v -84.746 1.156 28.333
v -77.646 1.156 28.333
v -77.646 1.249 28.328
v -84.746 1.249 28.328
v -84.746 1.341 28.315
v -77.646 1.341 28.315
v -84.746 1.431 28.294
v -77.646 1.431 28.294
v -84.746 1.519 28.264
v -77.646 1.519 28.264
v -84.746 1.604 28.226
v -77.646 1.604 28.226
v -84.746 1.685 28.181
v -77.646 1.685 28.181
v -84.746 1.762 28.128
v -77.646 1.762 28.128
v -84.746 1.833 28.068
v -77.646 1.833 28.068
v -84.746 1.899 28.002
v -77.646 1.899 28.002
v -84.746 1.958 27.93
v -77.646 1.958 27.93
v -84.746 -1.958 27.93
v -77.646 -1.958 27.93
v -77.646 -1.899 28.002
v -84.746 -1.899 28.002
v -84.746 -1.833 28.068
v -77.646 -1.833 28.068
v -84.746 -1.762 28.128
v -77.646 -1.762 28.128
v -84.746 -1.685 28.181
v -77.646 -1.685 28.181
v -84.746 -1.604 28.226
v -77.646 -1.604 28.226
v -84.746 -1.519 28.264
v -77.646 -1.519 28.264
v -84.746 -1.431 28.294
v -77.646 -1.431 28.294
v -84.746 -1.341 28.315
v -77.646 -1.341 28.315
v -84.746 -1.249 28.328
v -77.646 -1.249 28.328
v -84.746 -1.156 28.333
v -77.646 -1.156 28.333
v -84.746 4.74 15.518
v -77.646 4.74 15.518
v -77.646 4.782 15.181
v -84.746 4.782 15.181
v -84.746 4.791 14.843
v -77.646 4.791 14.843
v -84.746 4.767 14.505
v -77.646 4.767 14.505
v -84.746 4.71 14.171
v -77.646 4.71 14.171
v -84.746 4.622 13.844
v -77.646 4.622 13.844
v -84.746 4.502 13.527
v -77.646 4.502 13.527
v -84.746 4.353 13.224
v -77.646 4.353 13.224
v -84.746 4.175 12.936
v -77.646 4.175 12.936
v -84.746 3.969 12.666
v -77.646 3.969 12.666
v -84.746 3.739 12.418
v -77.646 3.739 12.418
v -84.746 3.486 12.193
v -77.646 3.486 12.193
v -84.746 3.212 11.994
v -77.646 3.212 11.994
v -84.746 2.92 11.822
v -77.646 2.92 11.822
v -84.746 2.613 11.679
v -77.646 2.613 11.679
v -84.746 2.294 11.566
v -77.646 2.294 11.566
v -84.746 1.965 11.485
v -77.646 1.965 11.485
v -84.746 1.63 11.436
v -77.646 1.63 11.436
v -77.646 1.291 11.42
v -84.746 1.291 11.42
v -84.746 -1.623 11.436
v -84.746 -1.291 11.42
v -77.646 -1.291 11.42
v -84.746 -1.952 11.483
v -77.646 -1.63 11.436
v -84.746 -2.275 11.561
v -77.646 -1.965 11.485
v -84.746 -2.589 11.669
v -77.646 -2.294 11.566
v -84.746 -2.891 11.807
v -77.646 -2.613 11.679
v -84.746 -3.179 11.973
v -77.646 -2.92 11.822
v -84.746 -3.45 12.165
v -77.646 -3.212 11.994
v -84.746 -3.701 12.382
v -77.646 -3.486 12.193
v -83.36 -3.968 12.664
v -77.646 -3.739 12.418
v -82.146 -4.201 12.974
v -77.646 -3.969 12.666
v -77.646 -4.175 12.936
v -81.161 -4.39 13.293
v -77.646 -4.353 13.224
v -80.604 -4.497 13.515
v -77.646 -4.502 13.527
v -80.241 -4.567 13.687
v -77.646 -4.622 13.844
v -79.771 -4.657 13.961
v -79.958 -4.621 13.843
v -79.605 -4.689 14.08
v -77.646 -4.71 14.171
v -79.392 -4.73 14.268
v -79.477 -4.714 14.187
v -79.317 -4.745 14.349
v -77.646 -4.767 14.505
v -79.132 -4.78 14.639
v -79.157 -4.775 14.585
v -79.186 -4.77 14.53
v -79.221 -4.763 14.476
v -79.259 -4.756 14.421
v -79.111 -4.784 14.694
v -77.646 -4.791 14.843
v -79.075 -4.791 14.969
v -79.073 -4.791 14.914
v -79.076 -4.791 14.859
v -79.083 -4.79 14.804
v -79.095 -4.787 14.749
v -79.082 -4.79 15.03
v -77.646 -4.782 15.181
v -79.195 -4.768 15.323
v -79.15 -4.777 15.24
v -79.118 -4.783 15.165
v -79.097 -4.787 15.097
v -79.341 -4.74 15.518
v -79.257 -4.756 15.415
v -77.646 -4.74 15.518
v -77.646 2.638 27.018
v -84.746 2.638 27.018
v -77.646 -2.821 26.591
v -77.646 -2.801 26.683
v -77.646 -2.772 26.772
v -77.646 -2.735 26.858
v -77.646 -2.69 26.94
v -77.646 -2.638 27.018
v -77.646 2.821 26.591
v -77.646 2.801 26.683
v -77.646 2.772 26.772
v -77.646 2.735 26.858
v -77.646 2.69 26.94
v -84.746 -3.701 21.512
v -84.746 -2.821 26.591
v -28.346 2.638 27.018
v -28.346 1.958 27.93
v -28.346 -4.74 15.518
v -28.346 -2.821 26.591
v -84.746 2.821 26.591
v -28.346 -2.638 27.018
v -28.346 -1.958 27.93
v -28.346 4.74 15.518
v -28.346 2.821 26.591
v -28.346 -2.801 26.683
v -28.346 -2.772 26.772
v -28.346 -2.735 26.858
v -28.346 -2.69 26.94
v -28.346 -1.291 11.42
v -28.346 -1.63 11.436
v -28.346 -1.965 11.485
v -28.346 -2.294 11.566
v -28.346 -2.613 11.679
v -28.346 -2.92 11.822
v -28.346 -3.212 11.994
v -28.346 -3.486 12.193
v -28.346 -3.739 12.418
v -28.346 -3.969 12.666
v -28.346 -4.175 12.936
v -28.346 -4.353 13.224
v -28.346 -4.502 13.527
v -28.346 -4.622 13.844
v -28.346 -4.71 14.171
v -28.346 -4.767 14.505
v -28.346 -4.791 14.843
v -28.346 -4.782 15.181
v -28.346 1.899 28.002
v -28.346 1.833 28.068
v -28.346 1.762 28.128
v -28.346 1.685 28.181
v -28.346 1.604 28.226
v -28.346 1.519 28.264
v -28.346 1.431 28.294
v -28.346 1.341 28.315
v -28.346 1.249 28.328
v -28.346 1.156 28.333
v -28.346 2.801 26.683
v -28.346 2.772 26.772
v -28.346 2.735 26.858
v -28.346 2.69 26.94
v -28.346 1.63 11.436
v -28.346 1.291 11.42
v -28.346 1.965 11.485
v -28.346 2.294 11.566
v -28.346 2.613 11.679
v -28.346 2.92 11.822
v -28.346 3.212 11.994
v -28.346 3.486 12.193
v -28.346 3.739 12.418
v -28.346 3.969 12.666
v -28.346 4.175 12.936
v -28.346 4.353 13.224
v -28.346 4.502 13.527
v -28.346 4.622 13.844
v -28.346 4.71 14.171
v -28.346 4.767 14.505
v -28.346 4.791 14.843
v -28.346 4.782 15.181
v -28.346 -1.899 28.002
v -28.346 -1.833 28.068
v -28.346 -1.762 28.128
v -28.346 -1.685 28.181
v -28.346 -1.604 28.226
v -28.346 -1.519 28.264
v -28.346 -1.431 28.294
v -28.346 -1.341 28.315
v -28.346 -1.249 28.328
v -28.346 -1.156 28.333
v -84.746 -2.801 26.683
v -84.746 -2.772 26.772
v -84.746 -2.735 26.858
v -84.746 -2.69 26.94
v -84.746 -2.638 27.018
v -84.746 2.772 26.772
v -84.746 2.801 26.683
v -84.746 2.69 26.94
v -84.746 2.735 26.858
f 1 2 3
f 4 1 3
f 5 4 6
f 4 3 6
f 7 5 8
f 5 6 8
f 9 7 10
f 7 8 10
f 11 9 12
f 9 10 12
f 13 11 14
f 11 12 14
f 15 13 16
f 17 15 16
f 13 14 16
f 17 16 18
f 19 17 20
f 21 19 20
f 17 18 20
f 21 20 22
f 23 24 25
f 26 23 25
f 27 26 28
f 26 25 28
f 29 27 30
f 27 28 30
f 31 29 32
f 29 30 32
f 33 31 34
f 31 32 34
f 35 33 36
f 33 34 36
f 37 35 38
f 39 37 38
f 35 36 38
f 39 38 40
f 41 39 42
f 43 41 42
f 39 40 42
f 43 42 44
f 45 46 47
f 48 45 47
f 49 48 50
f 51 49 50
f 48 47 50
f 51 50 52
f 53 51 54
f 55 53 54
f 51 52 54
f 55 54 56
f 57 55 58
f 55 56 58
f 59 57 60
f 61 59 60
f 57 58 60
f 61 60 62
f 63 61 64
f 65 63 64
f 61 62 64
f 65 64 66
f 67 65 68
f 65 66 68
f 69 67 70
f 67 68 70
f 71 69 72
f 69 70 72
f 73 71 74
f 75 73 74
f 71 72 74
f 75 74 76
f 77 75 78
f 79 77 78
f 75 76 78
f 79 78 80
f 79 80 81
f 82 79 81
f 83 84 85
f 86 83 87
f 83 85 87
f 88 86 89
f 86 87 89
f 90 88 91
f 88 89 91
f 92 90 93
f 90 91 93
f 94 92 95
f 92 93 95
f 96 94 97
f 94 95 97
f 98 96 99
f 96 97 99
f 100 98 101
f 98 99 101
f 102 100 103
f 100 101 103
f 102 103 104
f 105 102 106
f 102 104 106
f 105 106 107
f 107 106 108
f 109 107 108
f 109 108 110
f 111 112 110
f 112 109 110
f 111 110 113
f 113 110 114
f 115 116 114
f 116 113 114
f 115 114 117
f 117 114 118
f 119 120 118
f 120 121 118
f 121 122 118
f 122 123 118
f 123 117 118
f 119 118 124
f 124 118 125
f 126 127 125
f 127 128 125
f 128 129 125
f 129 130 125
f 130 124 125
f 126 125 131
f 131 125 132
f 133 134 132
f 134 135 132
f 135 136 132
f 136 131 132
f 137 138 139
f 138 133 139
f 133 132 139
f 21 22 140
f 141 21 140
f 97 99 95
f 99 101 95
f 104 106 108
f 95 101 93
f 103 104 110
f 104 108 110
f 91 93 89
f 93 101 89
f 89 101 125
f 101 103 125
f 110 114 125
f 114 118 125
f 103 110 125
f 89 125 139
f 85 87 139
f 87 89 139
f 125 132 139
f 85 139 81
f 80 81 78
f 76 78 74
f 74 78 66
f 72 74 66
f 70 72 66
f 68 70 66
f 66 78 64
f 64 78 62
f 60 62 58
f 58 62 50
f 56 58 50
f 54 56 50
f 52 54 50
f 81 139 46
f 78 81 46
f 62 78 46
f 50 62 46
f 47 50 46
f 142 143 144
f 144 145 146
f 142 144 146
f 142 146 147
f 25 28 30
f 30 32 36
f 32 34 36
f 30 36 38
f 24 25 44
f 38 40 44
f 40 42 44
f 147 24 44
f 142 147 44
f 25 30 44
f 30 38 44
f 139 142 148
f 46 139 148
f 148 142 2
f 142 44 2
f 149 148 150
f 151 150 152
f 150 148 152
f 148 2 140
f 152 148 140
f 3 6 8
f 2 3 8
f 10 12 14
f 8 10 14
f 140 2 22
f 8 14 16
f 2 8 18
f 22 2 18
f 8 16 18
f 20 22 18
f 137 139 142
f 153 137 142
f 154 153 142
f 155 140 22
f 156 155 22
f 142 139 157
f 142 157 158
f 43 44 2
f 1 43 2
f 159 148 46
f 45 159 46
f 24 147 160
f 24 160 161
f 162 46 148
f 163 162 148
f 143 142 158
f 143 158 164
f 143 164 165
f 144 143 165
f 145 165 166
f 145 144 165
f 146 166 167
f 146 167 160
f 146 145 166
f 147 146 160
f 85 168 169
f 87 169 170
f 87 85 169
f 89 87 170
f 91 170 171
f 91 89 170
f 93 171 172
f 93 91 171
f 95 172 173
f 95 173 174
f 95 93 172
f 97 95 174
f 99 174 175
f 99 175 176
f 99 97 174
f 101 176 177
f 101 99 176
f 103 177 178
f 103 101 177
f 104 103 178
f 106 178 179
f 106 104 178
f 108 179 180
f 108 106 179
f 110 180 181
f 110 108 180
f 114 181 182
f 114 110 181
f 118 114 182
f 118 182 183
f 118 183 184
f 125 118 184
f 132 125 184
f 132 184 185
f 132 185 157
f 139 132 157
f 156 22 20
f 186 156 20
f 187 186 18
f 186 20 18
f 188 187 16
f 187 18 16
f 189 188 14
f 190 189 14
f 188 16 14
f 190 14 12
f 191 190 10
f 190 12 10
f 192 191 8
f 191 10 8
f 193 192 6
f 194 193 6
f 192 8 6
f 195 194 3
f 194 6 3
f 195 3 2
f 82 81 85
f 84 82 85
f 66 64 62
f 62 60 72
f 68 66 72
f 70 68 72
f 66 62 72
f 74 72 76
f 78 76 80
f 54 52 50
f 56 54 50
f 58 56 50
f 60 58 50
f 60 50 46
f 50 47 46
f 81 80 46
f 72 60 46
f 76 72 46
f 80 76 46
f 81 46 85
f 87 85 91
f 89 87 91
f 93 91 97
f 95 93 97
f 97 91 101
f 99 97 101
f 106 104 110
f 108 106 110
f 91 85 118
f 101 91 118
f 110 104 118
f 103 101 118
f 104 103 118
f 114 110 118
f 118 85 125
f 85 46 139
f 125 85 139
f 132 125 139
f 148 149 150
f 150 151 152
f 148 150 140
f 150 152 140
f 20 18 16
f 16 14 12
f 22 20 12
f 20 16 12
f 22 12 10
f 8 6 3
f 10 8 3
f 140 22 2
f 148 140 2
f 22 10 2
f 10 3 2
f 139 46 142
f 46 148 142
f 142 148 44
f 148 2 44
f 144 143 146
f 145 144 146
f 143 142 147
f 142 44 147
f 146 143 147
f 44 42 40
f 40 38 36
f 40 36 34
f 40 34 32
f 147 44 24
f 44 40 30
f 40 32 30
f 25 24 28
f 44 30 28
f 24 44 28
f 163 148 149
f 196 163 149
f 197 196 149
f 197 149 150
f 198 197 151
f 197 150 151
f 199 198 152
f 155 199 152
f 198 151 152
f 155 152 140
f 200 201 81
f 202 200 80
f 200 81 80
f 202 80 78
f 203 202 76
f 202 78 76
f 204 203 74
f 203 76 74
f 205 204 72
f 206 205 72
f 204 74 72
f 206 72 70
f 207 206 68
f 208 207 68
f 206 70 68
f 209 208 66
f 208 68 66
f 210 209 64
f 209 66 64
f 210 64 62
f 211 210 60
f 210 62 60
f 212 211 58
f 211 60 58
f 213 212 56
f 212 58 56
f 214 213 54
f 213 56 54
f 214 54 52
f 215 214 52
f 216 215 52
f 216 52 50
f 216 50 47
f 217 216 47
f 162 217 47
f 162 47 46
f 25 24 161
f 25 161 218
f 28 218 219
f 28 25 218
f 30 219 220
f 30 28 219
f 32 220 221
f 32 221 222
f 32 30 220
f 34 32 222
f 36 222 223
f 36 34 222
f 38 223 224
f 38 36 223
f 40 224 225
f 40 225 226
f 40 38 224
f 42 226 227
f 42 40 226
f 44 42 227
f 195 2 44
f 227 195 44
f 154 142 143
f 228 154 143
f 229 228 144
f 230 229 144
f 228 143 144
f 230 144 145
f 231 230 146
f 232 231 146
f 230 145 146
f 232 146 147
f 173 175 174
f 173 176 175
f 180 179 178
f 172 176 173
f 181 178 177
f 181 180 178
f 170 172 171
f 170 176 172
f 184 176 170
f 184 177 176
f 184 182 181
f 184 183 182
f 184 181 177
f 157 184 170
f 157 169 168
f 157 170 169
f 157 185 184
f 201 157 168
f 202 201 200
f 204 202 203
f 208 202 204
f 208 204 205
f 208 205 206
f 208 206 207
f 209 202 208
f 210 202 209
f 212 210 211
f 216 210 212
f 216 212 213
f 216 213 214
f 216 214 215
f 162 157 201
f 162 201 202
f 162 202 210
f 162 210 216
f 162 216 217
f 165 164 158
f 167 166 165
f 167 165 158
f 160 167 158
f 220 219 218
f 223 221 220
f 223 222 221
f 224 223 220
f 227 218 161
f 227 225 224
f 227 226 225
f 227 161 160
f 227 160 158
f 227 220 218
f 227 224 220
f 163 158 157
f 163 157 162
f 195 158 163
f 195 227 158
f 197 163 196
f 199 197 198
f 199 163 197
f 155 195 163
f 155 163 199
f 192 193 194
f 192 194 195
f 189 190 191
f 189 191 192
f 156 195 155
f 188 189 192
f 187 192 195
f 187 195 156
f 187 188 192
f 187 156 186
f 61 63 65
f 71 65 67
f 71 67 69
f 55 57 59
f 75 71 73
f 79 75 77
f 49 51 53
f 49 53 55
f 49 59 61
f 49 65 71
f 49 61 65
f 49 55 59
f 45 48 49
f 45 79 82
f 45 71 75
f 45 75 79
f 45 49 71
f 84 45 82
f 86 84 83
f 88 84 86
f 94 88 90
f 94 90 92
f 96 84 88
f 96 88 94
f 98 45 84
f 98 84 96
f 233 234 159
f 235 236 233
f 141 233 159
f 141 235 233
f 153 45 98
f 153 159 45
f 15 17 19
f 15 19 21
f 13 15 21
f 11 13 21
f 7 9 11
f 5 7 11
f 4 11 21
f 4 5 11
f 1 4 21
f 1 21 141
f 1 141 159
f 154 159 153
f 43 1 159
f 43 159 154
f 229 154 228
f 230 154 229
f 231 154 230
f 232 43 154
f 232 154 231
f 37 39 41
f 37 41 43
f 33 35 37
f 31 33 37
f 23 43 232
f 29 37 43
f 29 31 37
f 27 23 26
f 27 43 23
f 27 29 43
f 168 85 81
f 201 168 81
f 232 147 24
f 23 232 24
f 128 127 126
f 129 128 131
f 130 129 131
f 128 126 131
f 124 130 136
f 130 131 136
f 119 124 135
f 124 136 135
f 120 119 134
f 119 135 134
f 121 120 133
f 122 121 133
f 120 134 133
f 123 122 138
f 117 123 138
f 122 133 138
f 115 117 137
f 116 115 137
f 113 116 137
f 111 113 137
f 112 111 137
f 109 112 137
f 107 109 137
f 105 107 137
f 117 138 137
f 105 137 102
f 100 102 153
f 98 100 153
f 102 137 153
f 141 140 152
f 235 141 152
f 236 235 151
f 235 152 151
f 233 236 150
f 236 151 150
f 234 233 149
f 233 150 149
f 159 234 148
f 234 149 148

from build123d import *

# Parameters (mm, degrees)
F3_DEPTH = 49.3
F5_DEPTH = 7.1
F8_DEPTH = 32.13


with BuildPart() as f3:
    # F2 (on face) → F3 (new body)
    with BuildSketch(Plane(origin=(-77.645592, 0, 0), x_dir=(0, -1, 0), z_dir=(-1, 0, 0))):
        with BuildLine():
            Line((1.155786, 28.332565), (0, 28.332565))
            Line((0, 28.332565), (0, 11.419919))
            Line((0, 11.419919), (1.291432, 11.419919))
            ThreePointArc((1.291432, 11.419919), (3.969264, 12.666208), (4.740038, 15.517511))
            Line((4.740038, 15.517511), (2.821152, 26.591083))
            ThreePointArc((2.821152, 26.591083), (2.754507, 26.815366), (2.637569, 27.018024))
            Line((2.637569, 27.018024), (1.957519, 27.930247))
            ThreePointArc((1.957519, 27.930247), (1.604294, 28.226344), (1.155786, 28.332565))
        make_face()
    extrude(amount=-F3_DEPTH)

    # F4: F3 across face


with BuildPart() as f3_1:
    add(f3.part)
    add(f3.part.mirror(Plane(origin=(-52.995592, 0, 19.876242), x_dir=(-1, 0, 0), z_dir=(0, 1, 0))))


with BuildPart() as f5:
    # F4_face (on face) → F5 (new body)
    with BuildSketch(Plane(origin=(-77.645592, 0, 19.141261), x_dir=(0, -1, 0), z_dir=(-1, 0, 0))):
        with BuildLine():
            ThreePointArc((1.957519, 8.788986), (1.604294, 9.085083), (1.155786, 9.191304))
            Line((1.155786, 9.191304), (-1.155786, 9.191304))
            ThreePointArc((-1.155786, 9.191304), (-1.604294, 9.085083), (-1.957519, 8.788986))
            Line((-1.957519, 8.788986), (-2.637569, 7.876763))
            ThreePointArc((-2.637569, 7.876763), (-2.754507, 7.674105), (-2.821152, 7.449822))
            Line((-2.821152, 7.449822), (-4.740038, -3.62375))
            ThreePointArc((-4.740038, -3.62375), (-3.969264, -6.475053), (-1.291432, -7.721342))
            Line((-1.291432, -7.721342), (1.291432, -7.721342))
            ThreePointArc((1.291432, -7.721342), (3.969264, -6.475053), (4.740038, -3.62375))
            Line((4.740038, -3.62375), (2.821152, 7.449822))
            ThreePointArc((2.821152, 7.449822), (2.754507, 7.674105), (2.637569, 7.876763))
            Line((2.637569, 7.876763), (1.957519, 8.788986))
        make_face()
    extrude(amount=F5_DEPTH)

    # F7 (on offset) → F8 (cut)
    with BuildSketch(Plane.XY.offset(39.6)):
        Polygon((-77.953771, -5.006557), (-85.29786, -3.595204), (-88.283174, -6.052011), (-83.669513, -8.151725), (-78.498788, -8.394549), align=None)
    extrude(amount=-F8_DEPTH, mode=Mode.SUBTRACT)


solid = Compound([f3_1.part, f5.part])
